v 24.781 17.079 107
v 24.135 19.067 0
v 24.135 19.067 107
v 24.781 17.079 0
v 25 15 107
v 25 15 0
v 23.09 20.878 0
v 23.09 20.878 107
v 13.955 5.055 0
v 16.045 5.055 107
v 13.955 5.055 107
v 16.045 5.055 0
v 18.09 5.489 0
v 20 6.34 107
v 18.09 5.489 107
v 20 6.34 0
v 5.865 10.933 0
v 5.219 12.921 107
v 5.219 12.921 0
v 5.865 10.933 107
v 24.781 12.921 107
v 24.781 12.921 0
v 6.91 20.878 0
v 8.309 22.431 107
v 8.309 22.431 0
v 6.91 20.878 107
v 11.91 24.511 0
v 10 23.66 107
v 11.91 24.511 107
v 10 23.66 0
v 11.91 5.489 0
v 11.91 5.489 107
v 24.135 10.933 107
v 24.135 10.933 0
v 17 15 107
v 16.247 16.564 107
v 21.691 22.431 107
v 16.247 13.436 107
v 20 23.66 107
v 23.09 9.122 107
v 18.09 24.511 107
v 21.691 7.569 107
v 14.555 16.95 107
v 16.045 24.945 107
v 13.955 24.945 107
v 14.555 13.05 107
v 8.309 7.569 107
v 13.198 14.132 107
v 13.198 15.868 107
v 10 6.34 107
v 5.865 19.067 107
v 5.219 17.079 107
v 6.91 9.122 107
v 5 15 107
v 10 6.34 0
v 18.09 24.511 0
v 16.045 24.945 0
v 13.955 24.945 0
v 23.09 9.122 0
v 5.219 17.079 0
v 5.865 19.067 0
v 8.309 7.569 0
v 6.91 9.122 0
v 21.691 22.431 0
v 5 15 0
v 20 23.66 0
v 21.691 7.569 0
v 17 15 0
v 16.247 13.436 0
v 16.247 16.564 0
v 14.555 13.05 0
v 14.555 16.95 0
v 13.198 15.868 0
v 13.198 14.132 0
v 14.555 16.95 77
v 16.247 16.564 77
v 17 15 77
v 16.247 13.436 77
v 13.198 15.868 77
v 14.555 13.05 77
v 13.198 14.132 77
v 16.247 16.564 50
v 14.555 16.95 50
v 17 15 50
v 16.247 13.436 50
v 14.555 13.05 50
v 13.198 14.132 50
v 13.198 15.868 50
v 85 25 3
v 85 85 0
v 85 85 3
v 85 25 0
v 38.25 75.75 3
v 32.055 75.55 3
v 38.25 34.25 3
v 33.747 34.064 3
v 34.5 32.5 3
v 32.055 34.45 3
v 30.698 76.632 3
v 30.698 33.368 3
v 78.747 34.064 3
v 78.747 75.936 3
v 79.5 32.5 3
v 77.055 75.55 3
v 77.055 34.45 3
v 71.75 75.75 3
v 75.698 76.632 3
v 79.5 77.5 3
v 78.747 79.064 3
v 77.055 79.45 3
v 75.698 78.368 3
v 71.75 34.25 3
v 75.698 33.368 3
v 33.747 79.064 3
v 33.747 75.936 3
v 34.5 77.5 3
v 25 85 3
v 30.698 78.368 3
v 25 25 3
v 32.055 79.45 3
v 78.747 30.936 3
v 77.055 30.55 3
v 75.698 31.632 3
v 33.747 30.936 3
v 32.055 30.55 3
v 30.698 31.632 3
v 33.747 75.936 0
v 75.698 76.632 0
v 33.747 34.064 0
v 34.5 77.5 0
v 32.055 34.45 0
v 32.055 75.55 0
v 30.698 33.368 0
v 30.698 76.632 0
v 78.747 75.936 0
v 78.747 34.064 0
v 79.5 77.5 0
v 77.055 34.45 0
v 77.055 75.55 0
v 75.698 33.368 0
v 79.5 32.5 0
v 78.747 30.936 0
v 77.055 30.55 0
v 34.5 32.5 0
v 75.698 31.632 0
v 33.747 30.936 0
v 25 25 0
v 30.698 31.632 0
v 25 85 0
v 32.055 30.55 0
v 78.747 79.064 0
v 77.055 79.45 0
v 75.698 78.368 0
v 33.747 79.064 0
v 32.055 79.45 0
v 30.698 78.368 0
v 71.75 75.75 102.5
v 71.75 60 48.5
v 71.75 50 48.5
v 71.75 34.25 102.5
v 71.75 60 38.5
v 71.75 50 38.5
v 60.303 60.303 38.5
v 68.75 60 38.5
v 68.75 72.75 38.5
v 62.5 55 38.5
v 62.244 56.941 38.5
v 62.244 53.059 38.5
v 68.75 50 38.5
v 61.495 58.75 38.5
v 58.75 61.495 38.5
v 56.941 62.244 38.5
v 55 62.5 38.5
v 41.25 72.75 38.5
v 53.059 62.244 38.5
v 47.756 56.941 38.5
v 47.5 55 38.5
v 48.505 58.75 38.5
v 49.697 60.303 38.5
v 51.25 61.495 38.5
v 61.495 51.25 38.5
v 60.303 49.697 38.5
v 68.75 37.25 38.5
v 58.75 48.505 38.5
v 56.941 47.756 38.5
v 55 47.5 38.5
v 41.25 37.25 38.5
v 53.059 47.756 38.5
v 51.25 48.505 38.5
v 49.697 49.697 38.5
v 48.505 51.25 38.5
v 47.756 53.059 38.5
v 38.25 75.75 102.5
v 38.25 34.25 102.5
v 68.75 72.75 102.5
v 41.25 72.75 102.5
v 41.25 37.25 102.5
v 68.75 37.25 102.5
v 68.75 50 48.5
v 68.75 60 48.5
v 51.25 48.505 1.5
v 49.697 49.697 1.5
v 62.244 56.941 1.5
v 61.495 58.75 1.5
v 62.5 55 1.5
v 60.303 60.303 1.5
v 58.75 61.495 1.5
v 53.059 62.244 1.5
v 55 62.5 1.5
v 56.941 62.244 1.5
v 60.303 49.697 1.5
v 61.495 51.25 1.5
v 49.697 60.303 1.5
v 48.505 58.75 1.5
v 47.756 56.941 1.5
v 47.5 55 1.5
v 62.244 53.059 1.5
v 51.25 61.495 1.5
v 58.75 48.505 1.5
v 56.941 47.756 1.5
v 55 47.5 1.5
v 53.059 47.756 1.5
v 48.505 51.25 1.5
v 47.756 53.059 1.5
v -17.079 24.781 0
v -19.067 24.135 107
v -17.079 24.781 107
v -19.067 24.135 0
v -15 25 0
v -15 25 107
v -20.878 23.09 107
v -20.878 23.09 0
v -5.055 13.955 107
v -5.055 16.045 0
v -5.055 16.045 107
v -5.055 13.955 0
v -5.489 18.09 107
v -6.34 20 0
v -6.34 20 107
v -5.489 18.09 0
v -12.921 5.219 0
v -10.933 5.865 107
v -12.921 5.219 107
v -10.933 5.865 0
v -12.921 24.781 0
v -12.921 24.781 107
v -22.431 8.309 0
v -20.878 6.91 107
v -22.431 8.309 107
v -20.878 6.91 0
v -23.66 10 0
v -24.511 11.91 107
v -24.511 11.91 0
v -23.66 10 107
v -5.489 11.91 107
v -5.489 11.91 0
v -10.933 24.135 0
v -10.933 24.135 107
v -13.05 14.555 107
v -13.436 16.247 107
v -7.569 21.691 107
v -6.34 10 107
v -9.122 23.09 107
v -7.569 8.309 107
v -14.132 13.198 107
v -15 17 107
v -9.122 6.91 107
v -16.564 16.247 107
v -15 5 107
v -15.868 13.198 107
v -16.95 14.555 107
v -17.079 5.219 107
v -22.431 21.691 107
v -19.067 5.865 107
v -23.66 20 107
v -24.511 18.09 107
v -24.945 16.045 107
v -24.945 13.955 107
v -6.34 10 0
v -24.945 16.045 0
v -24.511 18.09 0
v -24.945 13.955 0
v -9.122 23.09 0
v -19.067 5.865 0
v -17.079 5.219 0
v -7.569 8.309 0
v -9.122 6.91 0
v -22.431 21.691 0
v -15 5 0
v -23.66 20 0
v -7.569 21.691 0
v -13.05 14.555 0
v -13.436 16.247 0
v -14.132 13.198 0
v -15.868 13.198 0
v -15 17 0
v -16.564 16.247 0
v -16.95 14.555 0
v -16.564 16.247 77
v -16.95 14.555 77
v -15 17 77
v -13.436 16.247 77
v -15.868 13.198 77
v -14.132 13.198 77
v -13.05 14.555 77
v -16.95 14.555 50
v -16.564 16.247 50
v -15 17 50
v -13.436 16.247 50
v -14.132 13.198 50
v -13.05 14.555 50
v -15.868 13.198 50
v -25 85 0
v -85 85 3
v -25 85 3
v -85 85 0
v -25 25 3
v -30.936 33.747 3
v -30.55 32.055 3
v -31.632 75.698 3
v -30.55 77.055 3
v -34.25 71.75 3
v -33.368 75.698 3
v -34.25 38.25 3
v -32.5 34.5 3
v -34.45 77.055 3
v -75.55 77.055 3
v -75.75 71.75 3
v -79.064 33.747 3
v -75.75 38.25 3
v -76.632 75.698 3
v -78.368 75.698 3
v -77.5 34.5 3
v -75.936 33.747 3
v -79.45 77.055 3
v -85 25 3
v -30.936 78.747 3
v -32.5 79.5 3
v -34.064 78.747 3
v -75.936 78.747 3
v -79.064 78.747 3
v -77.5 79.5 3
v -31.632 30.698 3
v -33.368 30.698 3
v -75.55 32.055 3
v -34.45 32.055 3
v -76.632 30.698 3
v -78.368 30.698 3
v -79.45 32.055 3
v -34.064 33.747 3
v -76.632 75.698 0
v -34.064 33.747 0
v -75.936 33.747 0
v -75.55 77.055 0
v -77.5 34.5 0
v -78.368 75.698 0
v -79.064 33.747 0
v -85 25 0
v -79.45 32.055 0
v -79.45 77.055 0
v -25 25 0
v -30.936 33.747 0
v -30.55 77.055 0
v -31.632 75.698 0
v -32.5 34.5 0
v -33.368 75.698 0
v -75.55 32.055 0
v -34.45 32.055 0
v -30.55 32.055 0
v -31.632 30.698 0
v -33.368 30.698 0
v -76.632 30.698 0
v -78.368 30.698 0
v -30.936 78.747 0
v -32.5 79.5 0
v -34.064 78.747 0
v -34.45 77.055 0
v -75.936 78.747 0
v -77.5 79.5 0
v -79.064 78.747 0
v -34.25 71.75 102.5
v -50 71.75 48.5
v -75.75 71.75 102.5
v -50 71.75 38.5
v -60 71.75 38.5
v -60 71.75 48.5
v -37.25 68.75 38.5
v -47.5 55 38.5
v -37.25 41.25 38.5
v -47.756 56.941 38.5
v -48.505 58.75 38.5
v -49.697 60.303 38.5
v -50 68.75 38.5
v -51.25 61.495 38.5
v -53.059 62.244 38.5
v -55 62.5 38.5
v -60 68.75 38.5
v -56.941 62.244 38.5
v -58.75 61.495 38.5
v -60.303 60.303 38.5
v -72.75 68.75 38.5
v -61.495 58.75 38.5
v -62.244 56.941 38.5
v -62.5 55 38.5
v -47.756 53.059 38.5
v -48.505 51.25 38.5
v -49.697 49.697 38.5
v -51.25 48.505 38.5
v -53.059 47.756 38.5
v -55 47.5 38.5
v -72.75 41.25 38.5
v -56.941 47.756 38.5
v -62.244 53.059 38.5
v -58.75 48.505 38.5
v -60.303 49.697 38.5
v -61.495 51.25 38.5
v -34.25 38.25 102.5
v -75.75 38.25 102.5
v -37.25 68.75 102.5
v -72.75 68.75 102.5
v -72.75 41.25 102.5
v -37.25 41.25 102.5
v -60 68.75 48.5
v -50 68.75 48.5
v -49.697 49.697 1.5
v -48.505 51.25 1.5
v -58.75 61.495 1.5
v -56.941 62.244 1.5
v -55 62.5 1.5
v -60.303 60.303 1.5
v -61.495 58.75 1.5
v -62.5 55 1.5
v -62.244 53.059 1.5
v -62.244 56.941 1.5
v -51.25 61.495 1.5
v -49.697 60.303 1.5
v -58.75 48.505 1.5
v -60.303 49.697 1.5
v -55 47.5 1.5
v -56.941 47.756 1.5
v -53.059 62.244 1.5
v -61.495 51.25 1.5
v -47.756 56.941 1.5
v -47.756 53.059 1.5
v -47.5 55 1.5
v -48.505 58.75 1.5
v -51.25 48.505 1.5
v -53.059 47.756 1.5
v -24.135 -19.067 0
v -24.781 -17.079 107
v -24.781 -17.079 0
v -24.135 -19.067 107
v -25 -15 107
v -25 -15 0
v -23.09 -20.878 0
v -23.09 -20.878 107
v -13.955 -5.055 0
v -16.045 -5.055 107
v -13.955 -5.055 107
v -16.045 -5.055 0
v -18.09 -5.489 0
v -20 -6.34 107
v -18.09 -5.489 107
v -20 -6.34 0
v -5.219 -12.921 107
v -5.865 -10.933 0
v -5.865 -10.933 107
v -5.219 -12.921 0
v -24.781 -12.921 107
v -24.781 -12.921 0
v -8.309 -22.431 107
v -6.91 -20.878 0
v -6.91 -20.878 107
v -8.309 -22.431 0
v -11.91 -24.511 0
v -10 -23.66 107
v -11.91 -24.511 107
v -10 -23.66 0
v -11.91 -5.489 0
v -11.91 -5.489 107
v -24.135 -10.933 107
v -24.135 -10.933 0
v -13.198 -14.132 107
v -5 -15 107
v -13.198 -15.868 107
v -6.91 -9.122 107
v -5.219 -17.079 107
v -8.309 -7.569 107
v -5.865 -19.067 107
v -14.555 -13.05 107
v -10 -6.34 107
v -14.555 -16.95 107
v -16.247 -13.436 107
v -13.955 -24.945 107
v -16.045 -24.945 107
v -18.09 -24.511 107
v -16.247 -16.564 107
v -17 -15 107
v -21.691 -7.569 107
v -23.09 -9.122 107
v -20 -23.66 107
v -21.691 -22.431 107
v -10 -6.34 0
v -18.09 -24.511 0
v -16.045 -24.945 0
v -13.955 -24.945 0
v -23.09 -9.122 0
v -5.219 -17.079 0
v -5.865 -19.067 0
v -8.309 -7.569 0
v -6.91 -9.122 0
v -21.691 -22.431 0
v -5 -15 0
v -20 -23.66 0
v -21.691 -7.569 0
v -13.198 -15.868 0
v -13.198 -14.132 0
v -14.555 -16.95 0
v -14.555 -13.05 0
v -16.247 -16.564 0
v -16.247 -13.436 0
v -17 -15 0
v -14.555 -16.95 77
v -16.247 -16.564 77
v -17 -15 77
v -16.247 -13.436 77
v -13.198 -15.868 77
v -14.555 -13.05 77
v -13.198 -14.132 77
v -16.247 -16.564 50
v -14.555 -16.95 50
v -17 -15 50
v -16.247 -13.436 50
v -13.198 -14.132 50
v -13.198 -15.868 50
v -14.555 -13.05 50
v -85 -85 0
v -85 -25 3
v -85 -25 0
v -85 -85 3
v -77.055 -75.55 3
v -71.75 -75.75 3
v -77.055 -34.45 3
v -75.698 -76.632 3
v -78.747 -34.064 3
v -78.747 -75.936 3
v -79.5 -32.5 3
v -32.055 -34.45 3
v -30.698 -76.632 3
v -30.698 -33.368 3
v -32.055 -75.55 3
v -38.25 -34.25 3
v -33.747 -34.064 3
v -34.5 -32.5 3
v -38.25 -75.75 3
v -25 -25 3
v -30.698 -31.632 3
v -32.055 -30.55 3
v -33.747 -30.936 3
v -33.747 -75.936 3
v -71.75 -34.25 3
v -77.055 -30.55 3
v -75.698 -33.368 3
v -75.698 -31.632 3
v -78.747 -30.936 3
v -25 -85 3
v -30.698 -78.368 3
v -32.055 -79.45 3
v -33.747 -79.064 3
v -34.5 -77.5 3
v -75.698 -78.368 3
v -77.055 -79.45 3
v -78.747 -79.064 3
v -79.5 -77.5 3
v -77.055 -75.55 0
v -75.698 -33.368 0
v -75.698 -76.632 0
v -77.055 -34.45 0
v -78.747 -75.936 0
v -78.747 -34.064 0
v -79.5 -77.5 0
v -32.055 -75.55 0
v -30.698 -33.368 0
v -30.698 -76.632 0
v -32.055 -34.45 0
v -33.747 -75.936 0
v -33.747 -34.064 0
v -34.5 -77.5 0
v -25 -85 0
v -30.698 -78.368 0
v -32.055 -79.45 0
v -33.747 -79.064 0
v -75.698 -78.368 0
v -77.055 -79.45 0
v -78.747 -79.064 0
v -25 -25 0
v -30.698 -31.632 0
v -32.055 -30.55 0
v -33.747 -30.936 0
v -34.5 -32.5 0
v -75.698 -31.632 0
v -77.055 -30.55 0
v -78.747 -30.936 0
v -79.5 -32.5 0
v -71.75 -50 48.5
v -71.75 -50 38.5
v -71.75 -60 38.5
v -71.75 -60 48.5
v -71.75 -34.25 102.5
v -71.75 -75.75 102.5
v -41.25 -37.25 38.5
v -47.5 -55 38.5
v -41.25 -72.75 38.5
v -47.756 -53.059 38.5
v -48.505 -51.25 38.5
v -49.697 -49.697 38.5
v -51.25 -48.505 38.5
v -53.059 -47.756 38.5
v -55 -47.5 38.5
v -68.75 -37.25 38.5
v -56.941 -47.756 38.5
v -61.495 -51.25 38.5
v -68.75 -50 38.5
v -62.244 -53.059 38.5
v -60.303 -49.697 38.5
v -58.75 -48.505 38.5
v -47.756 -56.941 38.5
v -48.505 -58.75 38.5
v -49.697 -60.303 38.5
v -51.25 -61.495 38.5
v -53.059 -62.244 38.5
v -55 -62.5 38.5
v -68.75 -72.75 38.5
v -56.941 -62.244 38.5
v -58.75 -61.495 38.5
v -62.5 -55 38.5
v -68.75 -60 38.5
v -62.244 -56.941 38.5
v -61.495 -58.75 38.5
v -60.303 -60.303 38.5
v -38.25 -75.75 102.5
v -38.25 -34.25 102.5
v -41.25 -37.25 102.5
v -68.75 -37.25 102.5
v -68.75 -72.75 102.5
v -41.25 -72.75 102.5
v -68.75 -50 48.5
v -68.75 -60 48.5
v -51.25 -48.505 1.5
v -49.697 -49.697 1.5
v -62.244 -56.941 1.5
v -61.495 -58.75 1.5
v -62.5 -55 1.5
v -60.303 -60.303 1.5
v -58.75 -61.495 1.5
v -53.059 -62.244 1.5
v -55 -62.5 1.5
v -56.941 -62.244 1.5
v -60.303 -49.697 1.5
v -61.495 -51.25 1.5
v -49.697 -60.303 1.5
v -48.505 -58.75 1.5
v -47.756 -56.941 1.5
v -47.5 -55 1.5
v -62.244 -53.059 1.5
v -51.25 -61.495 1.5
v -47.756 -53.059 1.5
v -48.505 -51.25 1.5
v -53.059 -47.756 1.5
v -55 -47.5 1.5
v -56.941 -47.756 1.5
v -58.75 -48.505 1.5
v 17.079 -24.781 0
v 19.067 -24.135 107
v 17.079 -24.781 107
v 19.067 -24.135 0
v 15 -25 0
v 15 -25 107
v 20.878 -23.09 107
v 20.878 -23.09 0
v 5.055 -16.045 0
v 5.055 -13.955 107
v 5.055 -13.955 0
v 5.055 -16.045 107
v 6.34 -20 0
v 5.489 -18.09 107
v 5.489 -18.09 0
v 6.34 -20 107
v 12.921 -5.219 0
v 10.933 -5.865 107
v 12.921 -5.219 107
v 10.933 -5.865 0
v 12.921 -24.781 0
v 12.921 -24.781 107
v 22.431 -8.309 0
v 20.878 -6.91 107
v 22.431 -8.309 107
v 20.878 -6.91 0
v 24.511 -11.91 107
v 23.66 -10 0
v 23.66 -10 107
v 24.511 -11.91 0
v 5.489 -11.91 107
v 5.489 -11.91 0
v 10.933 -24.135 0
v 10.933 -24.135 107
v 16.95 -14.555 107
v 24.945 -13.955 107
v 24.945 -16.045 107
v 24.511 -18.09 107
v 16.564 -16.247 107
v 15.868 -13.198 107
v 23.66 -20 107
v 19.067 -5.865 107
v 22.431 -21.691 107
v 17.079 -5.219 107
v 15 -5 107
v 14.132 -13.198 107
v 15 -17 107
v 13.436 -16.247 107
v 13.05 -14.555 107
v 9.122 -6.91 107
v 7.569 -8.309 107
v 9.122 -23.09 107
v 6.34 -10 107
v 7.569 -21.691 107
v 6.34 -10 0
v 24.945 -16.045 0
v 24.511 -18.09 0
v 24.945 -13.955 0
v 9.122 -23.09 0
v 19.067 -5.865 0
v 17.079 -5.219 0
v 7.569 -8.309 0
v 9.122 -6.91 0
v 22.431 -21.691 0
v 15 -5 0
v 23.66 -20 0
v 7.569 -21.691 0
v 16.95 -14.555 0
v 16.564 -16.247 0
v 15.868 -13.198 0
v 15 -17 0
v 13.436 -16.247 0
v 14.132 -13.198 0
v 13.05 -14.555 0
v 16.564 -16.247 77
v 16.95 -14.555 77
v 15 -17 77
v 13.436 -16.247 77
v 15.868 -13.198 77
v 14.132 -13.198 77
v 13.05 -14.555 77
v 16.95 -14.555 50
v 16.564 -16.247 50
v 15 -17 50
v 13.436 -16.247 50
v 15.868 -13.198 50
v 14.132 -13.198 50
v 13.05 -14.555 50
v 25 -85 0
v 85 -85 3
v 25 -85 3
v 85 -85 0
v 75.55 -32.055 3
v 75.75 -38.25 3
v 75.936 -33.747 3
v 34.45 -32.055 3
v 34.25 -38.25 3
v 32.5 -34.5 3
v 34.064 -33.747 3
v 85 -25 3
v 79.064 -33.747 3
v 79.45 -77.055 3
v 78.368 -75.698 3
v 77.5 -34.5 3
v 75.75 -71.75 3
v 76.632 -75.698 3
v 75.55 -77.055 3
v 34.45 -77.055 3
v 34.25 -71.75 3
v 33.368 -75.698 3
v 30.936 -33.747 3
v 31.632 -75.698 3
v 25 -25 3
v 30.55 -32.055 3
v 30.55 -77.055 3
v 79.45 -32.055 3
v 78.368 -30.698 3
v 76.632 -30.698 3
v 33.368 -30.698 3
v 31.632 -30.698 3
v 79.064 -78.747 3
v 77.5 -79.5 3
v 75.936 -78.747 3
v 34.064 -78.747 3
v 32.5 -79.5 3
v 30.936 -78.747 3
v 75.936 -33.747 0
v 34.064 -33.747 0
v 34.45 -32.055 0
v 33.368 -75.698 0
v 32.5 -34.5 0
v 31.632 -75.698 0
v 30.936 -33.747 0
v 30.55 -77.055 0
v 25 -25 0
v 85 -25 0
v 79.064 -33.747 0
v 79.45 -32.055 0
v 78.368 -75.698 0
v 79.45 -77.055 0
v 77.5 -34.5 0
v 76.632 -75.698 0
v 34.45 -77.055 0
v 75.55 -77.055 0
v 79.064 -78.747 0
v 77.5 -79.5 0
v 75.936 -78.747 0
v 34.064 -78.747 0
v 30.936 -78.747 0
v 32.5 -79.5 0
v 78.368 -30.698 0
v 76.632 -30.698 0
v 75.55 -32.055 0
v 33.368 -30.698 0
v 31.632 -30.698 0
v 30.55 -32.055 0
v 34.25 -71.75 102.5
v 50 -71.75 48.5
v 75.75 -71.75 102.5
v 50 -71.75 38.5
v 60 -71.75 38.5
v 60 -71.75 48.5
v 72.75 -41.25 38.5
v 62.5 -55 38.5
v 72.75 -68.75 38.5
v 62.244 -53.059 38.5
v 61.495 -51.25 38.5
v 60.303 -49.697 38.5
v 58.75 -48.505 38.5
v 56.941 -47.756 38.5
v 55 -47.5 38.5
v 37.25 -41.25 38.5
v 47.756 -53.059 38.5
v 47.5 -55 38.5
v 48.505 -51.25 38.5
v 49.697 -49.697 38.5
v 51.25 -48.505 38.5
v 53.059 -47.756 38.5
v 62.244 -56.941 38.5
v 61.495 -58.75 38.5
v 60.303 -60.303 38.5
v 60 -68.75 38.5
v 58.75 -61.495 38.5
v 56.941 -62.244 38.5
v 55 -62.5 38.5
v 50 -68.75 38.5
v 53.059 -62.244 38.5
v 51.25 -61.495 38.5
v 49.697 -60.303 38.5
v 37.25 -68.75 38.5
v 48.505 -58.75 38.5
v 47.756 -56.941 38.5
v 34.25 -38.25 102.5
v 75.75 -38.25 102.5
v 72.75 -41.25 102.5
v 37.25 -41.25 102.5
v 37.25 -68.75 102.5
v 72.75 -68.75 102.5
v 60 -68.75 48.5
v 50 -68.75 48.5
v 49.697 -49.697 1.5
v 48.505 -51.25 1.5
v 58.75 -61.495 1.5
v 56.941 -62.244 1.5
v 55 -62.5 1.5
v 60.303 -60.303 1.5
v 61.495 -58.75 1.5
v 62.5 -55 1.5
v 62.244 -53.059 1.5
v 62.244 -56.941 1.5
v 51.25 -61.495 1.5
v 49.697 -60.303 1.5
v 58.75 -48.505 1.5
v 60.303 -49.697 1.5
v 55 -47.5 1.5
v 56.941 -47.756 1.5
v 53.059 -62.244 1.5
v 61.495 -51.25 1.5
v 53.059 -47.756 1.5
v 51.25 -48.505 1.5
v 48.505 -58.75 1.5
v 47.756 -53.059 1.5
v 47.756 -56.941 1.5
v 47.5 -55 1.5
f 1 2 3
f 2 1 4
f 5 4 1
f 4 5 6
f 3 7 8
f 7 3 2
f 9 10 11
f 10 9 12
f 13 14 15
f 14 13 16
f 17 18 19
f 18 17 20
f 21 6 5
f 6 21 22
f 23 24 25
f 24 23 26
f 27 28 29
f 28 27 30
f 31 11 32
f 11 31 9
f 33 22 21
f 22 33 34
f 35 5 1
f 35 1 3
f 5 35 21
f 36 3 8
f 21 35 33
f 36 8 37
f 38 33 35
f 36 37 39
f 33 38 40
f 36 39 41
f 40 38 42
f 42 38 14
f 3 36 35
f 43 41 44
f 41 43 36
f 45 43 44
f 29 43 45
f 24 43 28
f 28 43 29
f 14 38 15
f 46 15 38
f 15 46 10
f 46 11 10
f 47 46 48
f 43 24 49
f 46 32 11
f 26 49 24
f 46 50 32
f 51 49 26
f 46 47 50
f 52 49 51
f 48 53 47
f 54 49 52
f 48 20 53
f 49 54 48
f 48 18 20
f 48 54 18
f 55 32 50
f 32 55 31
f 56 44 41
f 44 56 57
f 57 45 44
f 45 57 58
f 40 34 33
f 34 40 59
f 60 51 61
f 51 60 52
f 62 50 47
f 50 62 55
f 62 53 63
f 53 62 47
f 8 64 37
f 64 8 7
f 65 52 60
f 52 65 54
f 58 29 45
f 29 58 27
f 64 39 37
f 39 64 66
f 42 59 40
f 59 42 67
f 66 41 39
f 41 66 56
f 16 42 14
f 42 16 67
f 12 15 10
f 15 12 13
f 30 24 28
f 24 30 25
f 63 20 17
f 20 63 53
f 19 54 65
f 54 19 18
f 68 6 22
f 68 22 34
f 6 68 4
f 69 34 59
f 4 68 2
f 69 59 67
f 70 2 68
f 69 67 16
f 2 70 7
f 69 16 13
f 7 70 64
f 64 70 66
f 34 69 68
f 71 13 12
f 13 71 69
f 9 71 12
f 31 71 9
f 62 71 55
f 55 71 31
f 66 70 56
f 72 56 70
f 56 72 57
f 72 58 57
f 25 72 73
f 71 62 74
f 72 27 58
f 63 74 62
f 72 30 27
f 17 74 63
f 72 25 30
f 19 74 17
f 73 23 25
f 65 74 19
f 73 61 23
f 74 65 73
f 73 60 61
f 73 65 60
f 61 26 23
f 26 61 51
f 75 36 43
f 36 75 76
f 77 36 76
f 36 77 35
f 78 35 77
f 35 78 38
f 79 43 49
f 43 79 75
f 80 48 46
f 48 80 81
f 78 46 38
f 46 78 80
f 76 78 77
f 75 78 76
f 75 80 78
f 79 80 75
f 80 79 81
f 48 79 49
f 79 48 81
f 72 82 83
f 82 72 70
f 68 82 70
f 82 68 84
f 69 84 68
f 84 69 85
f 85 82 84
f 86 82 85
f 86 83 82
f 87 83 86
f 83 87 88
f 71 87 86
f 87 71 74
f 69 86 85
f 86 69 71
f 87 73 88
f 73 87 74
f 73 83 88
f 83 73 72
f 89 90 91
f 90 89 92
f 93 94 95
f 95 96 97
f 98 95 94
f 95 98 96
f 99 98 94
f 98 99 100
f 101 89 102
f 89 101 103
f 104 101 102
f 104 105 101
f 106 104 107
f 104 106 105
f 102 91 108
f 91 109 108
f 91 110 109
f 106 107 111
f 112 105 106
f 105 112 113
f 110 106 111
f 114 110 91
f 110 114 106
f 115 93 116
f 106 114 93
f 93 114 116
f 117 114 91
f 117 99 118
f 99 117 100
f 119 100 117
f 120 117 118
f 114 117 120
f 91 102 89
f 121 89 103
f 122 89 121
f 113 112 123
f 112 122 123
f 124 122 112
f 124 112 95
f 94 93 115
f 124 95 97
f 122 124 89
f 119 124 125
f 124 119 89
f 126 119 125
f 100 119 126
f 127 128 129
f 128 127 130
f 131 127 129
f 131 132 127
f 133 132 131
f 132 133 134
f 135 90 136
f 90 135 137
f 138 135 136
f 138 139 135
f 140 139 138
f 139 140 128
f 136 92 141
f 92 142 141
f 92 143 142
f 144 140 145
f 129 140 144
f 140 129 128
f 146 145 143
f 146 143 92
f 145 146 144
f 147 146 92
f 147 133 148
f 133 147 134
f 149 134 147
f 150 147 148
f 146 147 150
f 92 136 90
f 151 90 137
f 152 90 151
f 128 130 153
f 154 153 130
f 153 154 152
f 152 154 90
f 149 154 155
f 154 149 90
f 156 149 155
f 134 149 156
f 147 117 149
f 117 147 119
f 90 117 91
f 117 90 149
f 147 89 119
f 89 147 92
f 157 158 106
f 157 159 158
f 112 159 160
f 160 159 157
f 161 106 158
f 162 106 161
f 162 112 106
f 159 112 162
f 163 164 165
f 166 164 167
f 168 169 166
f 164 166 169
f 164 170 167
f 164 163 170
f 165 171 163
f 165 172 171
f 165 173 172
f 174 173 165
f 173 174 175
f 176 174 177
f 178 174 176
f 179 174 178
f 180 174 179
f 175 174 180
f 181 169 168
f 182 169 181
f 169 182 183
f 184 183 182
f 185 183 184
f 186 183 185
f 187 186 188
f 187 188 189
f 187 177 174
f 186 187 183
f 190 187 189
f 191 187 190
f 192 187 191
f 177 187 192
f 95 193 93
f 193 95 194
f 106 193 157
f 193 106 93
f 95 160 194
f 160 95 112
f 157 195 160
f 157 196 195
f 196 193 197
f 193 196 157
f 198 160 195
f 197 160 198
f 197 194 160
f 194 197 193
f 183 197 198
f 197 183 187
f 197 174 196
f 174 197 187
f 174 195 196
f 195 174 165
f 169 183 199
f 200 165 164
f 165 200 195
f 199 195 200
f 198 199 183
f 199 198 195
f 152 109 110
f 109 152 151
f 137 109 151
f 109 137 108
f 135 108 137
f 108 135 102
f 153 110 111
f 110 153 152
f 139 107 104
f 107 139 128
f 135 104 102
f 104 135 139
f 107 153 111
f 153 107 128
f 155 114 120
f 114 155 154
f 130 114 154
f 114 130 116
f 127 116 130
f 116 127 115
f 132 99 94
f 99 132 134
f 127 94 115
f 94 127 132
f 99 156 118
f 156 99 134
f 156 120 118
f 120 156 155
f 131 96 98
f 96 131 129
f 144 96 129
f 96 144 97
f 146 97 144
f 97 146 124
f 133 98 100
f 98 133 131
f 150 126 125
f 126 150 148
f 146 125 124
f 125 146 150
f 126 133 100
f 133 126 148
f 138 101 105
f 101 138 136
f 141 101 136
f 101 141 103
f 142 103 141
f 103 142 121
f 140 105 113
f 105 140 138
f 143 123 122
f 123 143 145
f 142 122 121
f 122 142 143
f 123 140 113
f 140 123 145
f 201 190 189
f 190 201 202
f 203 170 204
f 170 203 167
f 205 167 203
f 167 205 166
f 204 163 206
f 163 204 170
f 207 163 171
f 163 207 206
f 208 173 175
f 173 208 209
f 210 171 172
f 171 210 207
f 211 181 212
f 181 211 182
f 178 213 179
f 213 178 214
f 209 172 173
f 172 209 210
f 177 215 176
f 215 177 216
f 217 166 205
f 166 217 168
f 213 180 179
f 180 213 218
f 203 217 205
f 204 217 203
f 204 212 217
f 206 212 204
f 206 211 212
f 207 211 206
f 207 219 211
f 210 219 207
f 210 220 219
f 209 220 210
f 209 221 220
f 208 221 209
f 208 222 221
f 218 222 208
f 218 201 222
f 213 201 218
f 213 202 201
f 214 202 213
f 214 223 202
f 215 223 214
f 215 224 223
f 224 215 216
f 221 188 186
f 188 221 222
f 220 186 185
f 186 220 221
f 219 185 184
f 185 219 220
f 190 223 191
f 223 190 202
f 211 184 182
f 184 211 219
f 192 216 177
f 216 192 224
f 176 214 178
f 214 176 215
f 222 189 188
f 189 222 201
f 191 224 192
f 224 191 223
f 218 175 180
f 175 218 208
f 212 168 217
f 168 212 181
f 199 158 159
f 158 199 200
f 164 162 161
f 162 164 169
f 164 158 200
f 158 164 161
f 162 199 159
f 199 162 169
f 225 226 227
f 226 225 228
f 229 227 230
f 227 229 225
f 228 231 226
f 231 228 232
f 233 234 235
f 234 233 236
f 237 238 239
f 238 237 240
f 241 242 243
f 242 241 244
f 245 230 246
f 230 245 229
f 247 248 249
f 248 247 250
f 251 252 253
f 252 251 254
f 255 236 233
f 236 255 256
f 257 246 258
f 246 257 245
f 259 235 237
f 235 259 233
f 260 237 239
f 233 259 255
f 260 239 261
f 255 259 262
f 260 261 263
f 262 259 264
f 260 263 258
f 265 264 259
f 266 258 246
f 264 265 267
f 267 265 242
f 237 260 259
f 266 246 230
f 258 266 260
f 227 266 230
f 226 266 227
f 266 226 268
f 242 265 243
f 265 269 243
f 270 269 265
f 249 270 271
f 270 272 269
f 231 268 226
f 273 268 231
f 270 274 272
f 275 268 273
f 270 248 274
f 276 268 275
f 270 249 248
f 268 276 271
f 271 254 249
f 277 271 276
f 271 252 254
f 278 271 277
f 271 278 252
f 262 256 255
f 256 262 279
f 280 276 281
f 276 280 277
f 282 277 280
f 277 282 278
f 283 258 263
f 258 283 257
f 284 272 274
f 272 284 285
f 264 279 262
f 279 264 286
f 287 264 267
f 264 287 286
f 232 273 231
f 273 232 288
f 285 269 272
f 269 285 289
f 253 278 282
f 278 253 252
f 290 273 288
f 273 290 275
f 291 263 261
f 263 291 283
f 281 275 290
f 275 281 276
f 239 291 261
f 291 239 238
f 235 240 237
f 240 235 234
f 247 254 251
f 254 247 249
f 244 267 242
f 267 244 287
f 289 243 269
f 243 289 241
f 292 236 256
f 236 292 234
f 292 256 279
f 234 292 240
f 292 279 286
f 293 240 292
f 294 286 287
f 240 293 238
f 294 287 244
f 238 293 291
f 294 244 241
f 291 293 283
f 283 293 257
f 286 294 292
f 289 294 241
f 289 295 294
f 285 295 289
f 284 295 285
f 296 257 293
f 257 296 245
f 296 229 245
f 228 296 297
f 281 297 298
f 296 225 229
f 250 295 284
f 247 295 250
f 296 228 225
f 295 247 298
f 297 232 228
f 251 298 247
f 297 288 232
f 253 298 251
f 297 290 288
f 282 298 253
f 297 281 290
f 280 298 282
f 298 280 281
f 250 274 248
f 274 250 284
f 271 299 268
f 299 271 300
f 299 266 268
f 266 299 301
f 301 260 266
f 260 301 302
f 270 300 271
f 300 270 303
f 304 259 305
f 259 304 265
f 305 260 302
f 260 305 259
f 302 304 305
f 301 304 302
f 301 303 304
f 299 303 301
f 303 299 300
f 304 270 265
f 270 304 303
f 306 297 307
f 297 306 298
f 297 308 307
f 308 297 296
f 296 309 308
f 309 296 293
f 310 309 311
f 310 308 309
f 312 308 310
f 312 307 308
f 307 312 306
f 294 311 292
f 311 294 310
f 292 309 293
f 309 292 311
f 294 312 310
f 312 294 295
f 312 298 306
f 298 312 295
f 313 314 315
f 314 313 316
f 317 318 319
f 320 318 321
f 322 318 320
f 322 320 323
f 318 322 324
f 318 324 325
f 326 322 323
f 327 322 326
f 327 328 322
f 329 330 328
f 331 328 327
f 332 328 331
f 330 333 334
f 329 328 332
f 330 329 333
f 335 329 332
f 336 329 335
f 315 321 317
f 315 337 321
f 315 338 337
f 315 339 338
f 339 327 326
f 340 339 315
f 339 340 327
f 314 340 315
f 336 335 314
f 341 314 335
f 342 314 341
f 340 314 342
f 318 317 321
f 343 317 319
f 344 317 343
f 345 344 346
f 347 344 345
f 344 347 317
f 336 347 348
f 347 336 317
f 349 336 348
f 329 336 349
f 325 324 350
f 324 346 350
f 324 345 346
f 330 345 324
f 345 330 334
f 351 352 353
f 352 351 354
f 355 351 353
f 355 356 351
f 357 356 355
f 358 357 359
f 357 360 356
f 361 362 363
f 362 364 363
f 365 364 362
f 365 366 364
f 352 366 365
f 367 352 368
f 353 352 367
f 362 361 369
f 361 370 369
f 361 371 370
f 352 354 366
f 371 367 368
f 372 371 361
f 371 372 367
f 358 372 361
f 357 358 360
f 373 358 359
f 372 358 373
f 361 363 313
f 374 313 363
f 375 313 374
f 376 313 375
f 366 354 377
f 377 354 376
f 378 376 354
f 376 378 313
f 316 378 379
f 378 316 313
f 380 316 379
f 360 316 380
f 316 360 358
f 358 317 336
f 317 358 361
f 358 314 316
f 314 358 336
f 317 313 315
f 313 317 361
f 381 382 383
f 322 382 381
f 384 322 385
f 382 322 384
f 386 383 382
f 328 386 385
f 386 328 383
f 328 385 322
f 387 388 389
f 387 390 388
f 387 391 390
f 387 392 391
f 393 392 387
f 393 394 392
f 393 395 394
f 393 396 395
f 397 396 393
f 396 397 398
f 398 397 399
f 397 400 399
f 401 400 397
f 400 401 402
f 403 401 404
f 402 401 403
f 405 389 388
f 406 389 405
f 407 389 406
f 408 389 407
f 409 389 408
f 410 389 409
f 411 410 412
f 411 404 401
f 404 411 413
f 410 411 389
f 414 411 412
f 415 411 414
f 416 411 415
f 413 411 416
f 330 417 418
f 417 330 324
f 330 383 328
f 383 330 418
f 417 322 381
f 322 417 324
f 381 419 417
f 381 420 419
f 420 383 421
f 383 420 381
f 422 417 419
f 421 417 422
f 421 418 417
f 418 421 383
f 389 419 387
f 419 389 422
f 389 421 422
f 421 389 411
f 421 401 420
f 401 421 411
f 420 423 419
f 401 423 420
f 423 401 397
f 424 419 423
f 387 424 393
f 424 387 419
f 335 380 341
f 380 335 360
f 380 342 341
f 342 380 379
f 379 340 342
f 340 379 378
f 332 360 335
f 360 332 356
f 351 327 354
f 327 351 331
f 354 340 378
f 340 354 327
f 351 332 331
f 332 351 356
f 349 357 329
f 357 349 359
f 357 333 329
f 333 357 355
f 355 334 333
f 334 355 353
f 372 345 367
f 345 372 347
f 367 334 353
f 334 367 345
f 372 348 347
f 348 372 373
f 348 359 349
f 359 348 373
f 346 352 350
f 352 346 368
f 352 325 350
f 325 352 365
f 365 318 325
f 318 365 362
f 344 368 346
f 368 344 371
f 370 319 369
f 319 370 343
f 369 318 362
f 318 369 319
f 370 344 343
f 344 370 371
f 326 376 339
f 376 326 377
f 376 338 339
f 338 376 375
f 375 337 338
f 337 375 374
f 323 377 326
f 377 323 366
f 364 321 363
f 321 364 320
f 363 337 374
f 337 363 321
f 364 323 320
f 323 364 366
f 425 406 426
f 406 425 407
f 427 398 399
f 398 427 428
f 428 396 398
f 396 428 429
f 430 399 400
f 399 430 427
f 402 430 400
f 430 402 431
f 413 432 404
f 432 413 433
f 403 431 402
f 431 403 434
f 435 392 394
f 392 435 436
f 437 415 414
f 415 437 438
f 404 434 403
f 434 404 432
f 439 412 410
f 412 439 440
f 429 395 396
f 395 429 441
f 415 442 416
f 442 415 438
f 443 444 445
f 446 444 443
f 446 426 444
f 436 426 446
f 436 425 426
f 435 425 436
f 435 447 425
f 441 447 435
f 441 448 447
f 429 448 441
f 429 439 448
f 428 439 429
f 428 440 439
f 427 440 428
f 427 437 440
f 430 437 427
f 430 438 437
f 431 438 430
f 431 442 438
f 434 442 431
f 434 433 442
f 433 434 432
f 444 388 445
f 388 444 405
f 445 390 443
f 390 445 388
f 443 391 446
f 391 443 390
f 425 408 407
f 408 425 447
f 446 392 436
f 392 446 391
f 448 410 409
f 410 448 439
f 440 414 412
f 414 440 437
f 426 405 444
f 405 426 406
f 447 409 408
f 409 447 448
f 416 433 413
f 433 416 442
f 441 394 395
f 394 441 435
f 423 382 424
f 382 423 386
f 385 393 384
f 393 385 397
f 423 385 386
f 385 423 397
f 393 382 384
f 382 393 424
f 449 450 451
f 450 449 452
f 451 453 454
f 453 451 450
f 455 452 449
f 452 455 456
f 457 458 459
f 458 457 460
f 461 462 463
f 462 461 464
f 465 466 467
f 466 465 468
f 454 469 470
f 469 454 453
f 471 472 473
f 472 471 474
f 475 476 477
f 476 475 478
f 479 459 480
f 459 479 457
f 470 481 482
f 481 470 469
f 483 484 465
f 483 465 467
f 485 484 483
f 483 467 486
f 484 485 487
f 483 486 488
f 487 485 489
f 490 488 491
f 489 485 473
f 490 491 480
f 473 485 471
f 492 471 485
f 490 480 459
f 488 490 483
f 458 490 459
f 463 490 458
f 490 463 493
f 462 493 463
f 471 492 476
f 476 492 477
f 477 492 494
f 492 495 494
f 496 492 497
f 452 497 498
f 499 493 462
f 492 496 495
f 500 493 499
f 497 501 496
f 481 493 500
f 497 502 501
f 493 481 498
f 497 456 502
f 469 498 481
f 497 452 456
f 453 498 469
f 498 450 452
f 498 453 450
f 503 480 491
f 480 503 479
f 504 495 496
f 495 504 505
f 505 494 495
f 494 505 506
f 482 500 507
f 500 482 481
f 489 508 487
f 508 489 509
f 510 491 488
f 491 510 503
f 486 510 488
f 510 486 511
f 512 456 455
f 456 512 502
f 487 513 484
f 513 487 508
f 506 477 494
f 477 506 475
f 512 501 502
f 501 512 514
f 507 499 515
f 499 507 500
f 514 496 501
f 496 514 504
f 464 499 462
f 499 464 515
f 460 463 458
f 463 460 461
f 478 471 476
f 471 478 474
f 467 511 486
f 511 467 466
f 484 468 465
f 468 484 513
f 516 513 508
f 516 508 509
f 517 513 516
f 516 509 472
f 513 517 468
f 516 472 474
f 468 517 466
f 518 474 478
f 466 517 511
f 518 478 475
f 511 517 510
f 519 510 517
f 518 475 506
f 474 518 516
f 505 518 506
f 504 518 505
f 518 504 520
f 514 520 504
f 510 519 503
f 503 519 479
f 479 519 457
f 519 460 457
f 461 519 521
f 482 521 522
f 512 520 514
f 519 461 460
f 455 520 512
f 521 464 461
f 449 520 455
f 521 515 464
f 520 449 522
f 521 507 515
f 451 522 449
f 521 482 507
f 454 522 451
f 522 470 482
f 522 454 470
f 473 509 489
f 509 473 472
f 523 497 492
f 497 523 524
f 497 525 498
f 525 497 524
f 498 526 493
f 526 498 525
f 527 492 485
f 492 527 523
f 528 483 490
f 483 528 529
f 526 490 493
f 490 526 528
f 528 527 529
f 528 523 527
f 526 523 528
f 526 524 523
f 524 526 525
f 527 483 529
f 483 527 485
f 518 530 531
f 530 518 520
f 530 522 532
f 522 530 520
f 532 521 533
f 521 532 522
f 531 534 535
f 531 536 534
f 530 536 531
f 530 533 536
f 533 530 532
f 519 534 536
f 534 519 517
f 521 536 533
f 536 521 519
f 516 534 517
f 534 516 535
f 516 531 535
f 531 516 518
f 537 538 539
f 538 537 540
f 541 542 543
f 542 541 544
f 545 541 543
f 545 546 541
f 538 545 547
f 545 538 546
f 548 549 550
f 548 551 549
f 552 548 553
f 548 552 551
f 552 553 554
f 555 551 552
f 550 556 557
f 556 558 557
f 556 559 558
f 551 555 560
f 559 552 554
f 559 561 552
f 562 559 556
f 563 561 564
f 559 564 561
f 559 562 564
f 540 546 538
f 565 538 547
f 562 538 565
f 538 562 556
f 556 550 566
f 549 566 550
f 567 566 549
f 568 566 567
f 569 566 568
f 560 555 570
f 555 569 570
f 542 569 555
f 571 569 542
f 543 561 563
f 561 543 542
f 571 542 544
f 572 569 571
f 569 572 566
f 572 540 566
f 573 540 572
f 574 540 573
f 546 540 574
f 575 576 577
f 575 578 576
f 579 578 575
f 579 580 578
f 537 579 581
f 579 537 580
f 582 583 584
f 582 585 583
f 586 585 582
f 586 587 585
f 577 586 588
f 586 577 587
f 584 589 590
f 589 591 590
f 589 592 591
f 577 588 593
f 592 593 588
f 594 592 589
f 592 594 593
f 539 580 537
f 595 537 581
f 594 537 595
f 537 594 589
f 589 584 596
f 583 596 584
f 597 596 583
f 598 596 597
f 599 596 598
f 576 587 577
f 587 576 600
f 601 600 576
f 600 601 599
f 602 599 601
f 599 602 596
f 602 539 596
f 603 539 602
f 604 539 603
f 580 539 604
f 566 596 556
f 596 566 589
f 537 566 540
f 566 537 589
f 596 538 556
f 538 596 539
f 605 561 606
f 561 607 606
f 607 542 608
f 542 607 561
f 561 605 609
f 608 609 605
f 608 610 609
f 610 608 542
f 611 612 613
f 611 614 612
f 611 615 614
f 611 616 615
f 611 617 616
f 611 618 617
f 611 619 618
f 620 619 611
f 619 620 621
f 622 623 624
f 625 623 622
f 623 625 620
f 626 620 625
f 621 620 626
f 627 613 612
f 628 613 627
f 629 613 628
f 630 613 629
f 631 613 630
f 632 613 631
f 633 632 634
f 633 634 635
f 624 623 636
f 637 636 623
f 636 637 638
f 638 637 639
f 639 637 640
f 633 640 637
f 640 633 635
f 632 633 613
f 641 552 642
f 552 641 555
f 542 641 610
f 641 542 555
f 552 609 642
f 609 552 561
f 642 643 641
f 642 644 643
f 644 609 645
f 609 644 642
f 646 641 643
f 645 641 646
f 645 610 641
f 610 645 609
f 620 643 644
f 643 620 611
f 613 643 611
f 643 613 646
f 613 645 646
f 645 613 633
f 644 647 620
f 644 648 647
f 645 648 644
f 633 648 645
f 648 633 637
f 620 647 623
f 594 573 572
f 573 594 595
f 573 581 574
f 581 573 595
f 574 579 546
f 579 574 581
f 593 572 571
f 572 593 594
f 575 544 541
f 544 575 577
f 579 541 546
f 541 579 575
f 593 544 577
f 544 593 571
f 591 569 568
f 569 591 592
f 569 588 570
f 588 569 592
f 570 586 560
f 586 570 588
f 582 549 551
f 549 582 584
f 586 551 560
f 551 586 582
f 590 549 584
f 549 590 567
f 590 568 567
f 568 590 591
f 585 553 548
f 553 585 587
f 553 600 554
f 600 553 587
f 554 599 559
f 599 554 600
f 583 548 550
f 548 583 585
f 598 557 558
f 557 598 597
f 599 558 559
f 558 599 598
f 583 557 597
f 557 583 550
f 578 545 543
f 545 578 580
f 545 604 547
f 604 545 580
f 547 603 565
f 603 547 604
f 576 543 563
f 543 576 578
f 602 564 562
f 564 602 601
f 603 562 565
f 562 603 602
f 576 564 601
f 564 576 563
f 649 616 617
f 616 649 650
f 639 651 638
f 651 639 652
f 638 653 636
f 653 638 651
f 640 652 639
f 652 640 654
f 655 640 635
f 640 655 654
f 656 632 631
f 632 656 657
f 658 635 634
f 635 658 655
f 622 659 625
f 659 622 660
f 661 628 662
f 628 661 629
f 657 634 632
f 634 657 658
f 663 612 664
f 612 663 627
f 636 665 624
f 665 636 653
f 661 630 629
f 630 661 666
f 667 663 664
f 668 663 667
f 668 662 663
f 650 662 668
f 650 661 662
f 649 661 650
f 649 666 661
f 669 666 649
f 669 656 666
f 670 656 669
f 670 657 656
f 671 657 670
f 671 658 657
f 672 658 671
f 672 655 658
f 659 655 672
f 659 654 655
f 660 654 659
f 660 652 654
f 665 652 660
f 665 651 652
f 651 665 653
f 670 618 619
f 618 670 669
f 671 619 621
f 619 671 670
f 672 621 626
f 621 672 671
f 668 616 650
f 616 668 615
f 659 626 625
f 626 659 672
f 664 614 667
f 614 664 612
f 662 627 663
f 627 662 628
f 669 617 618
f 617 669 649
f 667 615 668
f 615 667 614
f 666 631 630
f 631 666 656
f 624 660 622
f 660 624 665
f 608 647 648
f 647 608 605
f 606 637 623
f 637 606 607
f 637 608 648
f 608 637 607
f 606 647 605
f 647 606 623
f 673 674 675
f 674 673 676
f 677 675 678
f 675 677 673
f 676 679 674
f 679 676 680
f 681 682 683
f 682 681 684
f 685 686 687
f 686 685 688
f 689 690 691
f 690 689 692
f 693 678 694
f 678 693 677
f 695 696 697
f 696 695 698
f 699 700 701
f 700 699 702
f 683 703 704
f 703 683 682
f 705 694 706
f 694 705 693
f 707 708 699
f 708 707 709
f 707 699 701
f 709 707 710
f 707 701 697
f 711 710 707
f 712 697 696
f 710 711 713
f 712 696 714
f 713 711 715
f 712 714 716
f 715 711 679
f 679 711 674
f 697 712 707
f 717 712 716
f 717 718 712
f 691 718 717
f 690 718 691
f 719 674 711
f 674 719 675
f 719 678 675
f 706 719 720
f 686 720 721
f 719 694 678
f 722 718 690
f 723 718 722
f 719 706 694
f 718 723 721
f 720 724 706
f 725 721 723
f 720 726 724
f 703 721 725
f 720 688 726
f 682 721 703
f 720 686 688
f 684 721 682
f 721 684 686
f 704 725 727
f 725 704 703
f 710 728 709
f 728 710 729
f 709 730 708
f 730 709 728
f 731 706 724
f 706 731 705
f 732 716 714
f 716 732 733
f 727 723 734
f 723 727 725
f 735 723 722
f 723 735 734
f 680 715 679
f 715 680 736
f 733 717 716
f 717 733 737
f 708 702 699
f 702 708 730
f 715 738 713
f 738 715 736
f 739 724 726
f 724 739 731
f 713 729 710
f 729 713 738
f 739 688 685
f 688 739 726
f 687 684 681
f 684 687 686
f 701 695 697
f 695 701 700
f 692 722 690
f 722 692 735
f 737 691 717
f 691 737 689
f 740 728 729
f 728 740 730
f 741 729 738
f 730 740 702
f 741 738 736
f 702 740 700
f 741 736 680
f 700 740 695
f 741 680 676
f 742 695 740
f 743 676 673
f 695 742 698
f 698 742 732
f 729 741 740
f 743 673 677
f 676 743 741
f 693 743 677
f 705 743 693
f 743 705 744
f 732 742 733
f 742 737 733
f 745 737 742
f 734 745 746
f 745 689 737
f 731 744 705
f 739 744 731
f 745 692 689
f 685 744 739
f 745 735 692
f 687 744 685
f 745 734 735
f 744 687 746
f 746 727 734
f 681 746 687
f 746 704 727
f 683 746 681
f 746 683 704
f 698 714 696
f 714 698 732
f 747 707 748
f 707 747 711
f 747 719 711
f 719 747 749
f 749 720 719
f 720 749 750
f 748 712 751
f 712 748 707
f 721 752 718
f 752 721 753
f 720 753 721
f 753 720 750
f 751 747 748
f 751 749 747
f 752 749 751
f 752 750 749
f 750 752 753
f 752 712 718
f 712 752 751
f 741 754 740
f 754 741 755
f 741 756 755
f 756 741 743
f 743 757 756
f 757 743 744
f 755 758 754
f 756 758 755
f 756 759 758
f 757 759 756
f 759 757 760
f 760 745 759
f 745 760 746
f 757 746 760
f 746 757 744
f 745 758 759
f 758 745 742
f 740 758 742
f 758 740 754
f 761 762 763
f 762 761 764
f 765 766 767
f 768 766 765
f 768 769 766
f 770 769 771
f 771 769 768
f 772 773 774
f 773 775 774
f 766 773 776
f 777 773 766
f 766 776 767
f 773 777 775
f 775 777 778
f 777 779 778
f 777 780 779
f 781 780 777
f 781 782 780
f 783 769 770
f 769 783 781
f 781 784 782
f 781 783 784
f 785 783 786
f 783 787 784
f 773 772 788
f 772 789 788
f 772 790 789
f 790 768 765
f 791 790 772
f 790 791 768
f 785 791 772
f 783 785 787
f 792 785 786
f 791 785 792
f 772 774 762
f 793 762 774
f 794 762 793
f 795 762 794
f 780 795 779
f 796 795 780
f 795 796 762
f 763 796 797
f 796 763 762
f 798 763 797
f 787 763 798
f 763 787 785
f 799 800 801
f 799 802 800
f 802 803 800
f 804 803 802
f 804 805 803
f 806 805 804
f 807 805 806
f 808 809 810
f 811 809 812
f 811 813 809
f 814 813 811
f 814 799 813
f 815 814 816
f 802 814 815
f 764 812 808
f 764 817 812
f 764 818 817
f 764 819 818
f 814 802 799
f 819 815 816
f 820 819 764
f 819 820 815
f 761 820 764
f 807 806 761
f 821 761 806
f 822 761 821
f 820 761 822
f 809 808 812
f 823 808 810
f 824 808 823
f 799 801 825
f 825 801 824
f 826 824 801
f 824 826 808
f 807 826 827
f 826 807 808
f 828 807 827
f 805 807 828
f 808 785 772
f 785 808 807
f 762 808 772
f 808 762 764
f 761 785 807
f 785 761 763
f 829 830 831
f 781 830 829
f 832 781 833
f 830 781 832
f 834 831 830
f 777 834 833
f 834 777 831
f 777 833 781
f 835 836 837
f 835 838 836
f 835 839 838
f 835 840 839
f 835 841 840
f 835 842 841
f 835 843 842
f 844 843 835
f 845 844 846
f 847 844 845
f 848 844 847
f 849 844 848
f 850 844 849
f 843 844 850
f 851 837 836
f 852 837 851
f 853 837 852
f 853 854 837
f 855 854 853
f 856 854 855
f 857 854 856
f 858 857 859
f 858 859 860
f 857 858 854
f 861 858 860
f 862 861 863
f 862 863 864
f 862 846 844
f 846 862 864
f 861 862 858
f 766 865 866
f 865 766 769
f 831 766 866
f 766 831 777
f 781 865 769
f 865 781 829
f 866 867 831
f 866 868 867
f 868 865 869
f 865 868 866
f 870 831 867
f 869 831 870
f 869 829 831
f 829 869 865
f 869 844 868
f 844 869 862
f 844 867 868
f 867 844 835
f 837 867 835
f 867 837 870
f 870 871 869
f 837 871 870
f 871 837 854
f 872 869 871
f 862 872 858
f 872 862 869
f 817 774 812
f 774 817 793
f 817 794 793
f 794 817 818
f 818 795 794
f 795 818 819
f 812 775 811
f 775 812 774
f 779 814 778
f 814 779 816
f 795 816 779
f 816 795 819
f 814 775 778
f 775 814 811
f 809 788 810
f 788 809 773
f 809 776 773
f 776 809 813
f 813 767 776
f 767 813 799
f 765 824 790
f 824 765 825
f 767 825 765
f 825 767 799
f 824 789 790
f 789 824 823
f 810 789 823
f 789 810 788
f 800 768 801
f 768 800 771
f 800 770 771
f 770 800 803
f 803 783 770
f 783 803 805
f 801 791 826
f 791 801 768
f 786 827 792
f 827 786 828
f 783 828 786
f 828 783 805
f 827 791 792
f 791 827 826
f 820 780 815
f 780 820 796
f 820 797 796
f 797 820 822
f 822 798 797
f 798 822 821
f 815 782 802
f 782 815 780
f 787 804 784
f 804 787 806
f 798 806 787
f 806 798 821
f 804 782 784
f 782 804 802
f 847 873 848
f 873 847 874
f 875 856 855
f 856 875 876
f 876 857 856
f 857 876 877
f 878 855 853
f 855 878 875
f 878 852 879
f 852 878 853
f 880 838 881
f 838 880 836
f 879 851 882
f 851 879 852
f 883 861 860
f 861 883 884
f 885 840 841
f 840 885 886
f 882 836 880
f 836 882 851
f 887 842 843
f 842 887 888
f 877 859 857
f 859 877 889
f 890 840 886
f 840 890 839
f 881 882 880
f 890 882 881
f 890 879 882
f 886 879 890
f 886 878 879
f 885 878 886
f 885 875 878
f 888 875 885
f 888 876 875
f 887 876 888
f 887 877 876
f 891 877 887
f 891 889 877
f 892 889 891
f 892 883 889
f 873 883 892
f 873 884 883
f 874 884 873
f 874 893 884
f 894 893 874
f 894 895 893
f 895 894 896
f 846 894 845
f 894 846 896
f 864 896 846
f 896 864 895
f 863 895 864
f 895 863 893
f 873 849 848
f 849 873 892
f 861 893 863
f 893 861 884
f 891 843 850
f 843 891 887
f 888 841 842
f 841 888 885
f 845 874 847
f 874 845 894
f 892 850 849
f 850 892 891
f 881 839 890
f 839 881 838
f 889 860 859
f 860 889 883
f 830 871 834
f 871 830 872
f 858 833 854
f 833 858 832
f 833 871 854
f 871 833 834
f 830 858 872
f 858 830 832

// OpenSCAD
// radius of the circle of balls (average between external and internal radiuses)


//ball bearing stand
//stand();

// linear motor stand
//linear_motor();


// test cylinder
/*
translate([1,0,1])
rotate([90,90,0])
cylinder(2,d=2);*/
translate([-5,-5,0])
stand();
translate([25,25,0])
linear_motor();


rotate([0,0,90])
translate([-5,-5,0])
stand();
rotate([0,0,90])
translate([25,25,0])
linear_motor();


rotate([0,0,180])
translate([-5,-5,0])
stand();
rotate([0,0,180])
translate([25,25,0])
linear_motor();


rotate([0,0,270])
translate([-5,-5,0])
stand();
rotate([0,0,270])
translate([25,25,0])
linear_motor();

module stand() {
difference()
{
    stand_width = 20;
    stand_height = 107;
    base_width = 40;
    base_height = 3;
    union() {
            
       
	/*
          translate([-thickness,+7*support_length-thickness,-support_height])
          cube([2*support_length,2*support_length,support_height+support_height+2*thickness]);
    }
        */
        //stand
      
    //cube([stand_width,stand_width,stand_height]);
        translate([base_width/2, base_width/2,0]) 
        cylinder(stand_height,d = stand_width);
    
        //base
        
    //cube([base_width, base_width, base_height]);
        
        
        }
        
        // hold for middle screw
        translate([base_width/2,base_width/2,stand_height-30])
       cylinder(50,d=4);
        
        // hold for middle bottom screw
        translate([base_width/2,base_width/2,0])
       cylinder(50,d=4);
    //hold for screw
        /*
        translate([7*base_width/8,7*base_width/8,-base_height])
       cylinder(10,d=4);
        translate([1*base_width/8,7*base_width/8,-base_height])
       cylinder(10,d=4);
       translate([1*base_width/8,1*base_width/8,-base_height])
       cylinder(10,d=4);
       translate([7*base_width/8,1*base_width/8,-base_height])
       cylinder(10,d=4);*/
    
}
}

module linear_motor() {
    base_width = 60;
    base_height = 3;
    thickness = 3;
    motor_width = 30.5;
    motor_depth = 38.5;
    motor_height = 64;
    linear_height = 38.5;  //default 52.5
    
    back_piston_deep = 37;
    back_piston_width = 15;
    
    padded_width = motor_width+thickness;
    padded_depth = motor_depth+thickness;
    
    difference() {
        union() {
            
            // base
            cube([base_width, base_width, base_height]);
            
            // linear motor base
            translate([(base_width-padded_width)/2,(base_width-padded_depth)/2,0])
            cube([padded_width,padded_depth,linear_height]);
            
            // holder
            translate([(base_width-padded_width)/2,(base_width-padded_depth)/2,linear_height])
            cube([padded_width,thickness,motor_height]);
            
            translate([(base_width-padded_width)/2,(base_width-padded_depth)/2,linear_height])
            cube([thickness,padded_depth,motor_height]);
            
            translate([(base_width-padded_width)/2,(base_width-padded_depth)/2+motor_depth,linear_height])
            cube([padded_width,thickness,motor_height]);
            
            translate([(base_width-padded_width)/2+motor_width,(base_width-padded_depth)/2,linear_height])
            cube([thickness,padded_depth,motor_height]);
        }
        
        // screws
        
        translate([7*base_width/8,7*base_width/8,-base_height])
            cylinder(10,d=4);
        translate([1*base_width/8,7*base_width/8,-base_height])
            cylinder(10,d=4);
       translate([1*base_width/8,1*base_width/8,-base_height])
            cylinder(10,d=4);
       translate([7*base_width/8,1*base_width/8,-base_height])
            cylinder(10,d=4);
        
        // hole for piston back
        translate([base_width/2,base_width/2,linear_height-back_piston_deep])
            cylinder(back_piston_deep, d=back_piston_width);
        
        // screw holes linear motor
        /*
        translate([(base_width-padded_width)/2+5+1,(base_width-padded_depth)/2+thickness,linear_height+19.5+1])
        rotate([90,90,0])
            cylinder(thickness,d=3);
        
        translate([(base_width-padded_width)/2+17+1,(base_width-padded_depth)/2+thickness,linear_height+4.5+1])
        rotate([90,90,0])
            cylinder(thickness,d=3);*/
            
        // hole 
        translate([(base_width-padded_width)/2+motor_width,(base_width-10)/2,linear_height])
            cube([thickness,10,10]);
    }
}
